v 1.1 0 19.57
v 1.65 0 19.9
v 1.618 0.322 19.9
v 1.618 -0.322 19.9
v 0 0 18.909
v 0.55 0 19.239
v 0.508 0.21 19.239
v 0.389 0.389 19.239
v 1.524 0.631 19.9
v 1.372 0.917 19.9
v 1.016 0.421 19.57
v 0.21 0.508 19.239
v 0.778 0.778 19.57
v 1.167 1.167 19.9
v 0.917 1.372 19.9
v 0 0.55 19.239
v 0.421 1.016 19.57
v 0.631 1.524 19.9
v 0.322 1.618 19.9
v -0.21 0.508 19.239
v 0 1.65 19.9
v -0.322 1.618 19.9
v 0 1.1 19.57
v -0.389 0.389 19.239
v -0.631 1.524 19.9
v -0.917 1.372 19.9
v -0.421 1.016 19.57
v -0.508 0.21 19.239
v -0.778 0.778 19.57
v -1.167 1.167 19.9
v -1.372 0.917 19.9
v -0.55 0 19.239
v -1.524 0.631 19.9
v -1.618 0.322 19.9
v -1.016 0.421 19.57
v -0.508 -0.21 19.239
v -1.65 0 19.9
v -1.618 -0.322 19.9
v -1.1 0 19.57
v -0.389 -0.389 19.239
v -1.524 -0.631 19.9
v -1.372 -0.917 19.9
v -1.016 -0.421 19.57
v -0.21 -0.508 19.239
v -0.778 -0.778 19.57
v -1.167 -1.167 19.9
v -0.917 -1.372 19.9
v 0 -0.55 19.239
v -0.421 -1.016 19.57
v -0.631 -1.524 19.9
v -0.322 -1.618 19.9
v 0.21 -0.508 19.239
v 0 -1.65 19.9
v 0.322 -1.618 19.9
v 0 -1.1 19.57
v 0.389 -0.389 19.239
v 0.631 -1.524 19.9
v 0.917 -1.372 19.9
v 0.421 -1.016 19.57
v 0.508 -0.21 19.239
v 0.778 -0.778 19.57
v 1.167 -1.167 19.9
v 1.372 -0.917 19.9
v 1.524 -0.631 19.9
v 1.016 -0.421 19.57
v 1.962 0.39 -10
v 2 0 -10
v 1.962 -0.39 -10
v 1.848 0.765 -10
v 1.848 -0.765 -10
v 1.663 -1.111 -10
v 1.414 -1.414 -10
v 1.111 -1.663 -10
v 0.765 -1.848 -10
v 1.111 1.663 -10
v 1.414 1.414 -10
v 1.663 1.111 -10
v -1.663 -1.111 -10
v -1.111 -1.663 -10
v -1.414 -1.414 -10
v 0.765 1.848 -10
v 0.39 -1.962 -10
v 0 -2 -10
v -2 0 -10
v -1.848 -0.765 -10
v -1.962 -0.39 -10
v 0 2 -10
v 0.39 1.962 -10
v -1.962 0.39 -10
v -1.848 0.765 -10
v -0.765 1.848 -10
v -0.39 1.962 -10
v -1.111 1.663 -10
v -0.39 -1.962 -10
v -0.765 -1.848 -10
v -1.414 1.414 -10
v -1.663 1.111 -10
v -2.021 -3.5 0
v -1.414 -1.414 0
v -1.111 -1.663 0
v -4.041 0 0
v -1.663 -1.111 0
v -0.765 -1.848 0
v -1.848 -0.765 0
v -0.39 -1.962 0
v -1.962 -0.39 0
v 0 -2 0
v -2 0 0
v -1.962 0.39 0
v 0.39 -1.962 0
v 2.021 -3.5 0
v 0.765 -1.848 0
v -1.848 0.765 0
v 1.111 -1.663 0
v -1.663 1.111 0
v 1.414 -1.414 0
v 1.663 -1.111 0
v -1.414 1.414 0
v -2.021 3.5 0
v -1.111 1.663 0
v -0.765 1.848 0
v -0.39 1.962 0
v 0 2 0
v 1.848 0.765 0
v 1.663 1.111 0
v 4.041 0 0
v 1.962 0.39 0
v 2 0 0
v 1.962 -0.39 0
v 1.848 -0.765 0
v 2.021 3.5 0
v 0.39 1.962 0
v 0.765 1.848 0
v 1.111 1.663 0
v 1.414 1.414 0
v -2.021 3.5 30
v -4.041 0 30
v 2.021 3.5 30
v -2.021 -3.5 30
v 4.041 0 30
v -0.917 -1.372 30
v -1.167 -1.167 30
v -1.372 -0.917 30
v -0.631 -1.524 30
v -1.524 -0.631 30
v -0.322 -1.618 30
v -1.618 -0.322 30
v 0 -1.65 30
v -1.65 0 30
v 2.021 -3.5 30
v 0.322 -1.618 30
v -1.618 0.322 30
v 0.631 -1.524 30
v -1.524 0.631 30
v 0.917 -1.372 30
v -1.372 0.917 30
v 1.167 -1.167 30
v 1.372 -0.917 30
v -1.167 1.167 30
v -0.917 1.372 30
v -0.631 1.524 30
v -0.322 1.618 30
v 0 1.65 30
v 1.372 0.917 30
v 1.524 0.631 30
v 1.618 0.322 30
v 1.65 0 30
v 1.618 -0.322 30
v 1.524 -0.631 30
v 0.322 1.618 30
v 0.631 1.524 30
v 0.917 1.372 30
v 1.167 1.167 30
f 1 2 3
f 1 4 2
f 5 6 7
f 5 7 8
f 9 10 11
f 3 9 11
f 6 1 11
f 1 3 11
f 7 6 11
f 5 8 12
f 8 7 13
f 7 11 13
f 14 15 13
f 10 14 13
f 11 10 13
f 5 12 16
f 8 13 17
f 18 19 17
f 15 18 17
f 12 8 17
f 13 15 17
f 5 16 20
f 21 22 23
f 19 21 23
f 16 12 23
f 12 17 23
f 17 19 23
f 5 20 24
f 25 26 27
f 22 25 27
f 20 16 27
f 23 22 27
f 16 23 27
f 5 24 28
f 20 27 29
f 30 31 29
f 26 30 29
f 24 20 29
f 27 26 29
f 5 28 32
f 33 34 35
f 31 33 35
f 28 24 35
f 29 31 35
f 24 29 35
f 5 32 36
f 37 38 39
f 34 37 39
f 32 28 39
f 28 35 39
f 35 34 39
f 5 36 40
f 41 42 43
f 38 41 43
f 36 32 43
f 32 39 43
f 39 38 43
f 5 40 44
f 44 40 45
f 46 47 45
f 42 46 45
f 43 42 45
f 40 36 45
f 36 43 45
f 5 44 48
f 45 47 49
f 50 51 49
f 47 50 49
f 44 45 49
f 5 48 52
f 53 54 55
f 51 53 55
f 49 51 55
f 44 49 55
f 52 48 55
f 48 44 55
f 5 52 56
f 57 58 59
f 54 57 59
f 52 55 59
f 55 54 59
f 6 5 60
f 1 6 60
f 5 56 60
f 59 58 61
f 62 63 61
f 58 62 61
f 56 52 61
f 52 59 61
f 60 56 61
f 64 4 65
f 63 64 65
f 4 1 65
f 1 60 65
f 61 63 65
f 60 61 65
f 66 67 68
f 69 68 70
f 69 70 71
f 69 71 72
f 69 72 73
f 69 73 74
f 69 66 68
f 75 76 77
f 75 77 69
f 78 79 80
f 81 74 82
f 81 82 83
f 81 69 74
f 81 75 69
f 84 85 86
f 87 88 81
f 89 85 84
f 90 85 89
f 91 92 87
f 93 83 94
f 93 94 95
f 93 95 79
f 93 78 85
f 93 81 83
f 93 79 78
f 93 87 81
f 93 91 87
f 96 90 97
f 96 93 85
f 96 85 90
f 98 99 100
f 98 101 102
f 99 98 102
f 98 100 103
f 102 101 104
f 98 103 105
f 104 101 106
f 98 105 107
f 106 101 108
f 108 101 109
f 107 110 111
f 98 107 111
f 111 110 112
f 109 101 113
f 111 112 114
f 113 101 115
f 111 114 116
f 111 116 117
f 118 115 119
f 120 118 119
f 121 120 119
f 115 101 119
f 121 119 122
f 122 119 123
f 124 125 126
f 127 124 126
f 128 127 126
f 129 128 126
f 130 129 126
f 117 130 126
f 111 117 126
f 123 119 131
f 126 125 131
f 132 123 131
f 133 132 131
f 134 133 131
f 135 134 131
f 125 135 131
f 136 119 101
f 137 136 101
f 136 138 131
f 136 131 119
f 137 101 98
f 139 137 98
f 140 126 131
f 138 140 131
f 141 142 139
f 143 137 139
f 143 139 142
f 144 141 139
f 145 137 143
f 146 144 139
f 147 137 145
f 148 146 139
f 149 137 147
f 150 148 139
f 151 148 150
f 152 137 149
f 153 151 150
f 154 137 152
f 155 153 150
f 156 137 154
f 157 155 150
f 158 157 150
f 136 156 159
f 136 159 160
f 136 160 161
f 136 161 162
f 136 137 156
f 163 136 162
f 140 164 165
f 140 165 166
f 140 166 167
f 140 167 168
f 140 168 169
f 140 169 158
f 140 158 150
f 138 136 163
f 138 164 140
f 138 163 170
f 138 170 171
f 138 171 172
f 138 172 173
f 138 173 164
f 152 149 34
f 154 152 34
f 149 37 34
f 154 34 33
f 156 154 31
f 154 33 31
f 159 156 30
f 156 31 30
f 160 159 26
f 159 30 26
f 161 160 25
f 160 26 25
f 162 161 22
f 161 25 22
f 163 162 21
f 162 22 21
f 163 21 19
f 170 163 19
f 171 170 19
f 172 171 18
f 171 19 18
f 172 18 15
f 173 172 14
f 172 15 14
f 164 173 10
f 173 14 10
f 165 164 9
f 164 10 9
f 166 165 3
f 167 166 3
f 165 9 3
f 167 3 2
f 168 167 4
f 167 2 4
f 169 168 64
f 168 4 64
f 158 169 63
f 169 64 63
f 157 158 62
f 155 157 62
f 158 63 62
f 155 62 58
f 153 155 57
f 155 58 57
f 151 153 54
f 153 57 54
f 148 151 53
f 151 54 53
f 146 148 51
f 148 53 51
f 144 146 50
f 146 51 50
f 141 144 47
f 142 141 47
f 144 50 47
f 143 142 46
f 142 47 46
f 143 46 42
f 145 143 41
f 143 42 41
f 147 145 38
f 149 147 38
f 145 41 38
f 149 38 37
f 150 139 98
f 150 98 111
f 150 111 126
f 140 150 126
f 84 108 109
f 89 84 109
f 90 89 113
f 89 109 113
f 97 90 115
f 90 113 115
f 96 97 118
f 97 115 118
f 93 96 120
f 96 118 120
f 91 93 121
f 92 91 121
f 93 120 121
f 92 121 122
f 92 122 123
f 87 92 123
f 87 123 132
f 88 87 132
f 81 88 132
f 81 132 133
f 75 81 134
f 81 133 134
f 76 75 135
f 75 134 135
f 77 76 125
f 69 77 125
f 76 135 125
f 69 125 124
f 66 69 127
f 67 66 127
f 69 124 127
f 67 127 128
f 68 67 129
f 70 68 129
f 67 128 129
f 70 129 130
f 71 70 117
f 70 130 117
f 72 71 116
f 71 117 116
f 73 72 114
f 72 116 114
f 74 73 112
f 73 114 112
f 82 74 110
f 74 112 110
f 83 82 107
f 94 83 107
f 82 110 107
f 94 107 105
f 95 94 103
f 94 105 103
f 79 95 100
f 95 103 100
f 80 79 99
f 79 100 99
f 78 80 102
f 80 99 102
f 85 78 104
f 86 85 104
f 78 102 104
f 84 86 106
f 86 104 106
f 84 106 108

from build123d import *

# Parameters (mm, degrees)
EXTRUDE_1_DEPTH = 30
SKETCH_4_R      = 2
EXTRUDE_2_DEPTH = 10
M4X0_7_1_D      = 3.3
M4X0_7_1_DEPTH  = 10.1
M4X0_7_1_TIP    = 0.991420021


with BuildPart() as part:
    # 草圖1 → 填料-伸長1 (new body)
    with BuildSketch(Plane.XY):
        Polygon((-2.020725942, 3.5), (-4.041451884, 0), (-2.020725942, -3.5), (2.020725942, -3.5), (4.041451884, 0), (2.020725942, 3.5), align=None)
    extrude(amount=EXTRUDE_1_DEPTH)

    # 草圖4 → 填料-伸長2 (add)
    with BuildSketch(Plane(origin=(0, 0, 0), x_dir=(-1, 0, 0), z_dir=(0, 0, -1))):
        Circle(SKETCH_4_R)
    extrude(amount=EXTRUDE_2_DEPTH)

    # M4x0.7 螺紋孔1
    with Locations(Plane.XY.offset(30)):
        with Locations((0, 0)):
            Hole(M4X0_7_1_D / 2, depth=M4X0_7_1_DEPTH)
            with Locations((0, 0, -(M4X0_7_1_DEPTH + M4X0_7_1_TIP / 2))):  # 118° drill point
                Cone(0, M4X0_7_1_D / 2, M4X0_7_1_TIP, mode=Mode.SUBTRACT)


solid = part.part
